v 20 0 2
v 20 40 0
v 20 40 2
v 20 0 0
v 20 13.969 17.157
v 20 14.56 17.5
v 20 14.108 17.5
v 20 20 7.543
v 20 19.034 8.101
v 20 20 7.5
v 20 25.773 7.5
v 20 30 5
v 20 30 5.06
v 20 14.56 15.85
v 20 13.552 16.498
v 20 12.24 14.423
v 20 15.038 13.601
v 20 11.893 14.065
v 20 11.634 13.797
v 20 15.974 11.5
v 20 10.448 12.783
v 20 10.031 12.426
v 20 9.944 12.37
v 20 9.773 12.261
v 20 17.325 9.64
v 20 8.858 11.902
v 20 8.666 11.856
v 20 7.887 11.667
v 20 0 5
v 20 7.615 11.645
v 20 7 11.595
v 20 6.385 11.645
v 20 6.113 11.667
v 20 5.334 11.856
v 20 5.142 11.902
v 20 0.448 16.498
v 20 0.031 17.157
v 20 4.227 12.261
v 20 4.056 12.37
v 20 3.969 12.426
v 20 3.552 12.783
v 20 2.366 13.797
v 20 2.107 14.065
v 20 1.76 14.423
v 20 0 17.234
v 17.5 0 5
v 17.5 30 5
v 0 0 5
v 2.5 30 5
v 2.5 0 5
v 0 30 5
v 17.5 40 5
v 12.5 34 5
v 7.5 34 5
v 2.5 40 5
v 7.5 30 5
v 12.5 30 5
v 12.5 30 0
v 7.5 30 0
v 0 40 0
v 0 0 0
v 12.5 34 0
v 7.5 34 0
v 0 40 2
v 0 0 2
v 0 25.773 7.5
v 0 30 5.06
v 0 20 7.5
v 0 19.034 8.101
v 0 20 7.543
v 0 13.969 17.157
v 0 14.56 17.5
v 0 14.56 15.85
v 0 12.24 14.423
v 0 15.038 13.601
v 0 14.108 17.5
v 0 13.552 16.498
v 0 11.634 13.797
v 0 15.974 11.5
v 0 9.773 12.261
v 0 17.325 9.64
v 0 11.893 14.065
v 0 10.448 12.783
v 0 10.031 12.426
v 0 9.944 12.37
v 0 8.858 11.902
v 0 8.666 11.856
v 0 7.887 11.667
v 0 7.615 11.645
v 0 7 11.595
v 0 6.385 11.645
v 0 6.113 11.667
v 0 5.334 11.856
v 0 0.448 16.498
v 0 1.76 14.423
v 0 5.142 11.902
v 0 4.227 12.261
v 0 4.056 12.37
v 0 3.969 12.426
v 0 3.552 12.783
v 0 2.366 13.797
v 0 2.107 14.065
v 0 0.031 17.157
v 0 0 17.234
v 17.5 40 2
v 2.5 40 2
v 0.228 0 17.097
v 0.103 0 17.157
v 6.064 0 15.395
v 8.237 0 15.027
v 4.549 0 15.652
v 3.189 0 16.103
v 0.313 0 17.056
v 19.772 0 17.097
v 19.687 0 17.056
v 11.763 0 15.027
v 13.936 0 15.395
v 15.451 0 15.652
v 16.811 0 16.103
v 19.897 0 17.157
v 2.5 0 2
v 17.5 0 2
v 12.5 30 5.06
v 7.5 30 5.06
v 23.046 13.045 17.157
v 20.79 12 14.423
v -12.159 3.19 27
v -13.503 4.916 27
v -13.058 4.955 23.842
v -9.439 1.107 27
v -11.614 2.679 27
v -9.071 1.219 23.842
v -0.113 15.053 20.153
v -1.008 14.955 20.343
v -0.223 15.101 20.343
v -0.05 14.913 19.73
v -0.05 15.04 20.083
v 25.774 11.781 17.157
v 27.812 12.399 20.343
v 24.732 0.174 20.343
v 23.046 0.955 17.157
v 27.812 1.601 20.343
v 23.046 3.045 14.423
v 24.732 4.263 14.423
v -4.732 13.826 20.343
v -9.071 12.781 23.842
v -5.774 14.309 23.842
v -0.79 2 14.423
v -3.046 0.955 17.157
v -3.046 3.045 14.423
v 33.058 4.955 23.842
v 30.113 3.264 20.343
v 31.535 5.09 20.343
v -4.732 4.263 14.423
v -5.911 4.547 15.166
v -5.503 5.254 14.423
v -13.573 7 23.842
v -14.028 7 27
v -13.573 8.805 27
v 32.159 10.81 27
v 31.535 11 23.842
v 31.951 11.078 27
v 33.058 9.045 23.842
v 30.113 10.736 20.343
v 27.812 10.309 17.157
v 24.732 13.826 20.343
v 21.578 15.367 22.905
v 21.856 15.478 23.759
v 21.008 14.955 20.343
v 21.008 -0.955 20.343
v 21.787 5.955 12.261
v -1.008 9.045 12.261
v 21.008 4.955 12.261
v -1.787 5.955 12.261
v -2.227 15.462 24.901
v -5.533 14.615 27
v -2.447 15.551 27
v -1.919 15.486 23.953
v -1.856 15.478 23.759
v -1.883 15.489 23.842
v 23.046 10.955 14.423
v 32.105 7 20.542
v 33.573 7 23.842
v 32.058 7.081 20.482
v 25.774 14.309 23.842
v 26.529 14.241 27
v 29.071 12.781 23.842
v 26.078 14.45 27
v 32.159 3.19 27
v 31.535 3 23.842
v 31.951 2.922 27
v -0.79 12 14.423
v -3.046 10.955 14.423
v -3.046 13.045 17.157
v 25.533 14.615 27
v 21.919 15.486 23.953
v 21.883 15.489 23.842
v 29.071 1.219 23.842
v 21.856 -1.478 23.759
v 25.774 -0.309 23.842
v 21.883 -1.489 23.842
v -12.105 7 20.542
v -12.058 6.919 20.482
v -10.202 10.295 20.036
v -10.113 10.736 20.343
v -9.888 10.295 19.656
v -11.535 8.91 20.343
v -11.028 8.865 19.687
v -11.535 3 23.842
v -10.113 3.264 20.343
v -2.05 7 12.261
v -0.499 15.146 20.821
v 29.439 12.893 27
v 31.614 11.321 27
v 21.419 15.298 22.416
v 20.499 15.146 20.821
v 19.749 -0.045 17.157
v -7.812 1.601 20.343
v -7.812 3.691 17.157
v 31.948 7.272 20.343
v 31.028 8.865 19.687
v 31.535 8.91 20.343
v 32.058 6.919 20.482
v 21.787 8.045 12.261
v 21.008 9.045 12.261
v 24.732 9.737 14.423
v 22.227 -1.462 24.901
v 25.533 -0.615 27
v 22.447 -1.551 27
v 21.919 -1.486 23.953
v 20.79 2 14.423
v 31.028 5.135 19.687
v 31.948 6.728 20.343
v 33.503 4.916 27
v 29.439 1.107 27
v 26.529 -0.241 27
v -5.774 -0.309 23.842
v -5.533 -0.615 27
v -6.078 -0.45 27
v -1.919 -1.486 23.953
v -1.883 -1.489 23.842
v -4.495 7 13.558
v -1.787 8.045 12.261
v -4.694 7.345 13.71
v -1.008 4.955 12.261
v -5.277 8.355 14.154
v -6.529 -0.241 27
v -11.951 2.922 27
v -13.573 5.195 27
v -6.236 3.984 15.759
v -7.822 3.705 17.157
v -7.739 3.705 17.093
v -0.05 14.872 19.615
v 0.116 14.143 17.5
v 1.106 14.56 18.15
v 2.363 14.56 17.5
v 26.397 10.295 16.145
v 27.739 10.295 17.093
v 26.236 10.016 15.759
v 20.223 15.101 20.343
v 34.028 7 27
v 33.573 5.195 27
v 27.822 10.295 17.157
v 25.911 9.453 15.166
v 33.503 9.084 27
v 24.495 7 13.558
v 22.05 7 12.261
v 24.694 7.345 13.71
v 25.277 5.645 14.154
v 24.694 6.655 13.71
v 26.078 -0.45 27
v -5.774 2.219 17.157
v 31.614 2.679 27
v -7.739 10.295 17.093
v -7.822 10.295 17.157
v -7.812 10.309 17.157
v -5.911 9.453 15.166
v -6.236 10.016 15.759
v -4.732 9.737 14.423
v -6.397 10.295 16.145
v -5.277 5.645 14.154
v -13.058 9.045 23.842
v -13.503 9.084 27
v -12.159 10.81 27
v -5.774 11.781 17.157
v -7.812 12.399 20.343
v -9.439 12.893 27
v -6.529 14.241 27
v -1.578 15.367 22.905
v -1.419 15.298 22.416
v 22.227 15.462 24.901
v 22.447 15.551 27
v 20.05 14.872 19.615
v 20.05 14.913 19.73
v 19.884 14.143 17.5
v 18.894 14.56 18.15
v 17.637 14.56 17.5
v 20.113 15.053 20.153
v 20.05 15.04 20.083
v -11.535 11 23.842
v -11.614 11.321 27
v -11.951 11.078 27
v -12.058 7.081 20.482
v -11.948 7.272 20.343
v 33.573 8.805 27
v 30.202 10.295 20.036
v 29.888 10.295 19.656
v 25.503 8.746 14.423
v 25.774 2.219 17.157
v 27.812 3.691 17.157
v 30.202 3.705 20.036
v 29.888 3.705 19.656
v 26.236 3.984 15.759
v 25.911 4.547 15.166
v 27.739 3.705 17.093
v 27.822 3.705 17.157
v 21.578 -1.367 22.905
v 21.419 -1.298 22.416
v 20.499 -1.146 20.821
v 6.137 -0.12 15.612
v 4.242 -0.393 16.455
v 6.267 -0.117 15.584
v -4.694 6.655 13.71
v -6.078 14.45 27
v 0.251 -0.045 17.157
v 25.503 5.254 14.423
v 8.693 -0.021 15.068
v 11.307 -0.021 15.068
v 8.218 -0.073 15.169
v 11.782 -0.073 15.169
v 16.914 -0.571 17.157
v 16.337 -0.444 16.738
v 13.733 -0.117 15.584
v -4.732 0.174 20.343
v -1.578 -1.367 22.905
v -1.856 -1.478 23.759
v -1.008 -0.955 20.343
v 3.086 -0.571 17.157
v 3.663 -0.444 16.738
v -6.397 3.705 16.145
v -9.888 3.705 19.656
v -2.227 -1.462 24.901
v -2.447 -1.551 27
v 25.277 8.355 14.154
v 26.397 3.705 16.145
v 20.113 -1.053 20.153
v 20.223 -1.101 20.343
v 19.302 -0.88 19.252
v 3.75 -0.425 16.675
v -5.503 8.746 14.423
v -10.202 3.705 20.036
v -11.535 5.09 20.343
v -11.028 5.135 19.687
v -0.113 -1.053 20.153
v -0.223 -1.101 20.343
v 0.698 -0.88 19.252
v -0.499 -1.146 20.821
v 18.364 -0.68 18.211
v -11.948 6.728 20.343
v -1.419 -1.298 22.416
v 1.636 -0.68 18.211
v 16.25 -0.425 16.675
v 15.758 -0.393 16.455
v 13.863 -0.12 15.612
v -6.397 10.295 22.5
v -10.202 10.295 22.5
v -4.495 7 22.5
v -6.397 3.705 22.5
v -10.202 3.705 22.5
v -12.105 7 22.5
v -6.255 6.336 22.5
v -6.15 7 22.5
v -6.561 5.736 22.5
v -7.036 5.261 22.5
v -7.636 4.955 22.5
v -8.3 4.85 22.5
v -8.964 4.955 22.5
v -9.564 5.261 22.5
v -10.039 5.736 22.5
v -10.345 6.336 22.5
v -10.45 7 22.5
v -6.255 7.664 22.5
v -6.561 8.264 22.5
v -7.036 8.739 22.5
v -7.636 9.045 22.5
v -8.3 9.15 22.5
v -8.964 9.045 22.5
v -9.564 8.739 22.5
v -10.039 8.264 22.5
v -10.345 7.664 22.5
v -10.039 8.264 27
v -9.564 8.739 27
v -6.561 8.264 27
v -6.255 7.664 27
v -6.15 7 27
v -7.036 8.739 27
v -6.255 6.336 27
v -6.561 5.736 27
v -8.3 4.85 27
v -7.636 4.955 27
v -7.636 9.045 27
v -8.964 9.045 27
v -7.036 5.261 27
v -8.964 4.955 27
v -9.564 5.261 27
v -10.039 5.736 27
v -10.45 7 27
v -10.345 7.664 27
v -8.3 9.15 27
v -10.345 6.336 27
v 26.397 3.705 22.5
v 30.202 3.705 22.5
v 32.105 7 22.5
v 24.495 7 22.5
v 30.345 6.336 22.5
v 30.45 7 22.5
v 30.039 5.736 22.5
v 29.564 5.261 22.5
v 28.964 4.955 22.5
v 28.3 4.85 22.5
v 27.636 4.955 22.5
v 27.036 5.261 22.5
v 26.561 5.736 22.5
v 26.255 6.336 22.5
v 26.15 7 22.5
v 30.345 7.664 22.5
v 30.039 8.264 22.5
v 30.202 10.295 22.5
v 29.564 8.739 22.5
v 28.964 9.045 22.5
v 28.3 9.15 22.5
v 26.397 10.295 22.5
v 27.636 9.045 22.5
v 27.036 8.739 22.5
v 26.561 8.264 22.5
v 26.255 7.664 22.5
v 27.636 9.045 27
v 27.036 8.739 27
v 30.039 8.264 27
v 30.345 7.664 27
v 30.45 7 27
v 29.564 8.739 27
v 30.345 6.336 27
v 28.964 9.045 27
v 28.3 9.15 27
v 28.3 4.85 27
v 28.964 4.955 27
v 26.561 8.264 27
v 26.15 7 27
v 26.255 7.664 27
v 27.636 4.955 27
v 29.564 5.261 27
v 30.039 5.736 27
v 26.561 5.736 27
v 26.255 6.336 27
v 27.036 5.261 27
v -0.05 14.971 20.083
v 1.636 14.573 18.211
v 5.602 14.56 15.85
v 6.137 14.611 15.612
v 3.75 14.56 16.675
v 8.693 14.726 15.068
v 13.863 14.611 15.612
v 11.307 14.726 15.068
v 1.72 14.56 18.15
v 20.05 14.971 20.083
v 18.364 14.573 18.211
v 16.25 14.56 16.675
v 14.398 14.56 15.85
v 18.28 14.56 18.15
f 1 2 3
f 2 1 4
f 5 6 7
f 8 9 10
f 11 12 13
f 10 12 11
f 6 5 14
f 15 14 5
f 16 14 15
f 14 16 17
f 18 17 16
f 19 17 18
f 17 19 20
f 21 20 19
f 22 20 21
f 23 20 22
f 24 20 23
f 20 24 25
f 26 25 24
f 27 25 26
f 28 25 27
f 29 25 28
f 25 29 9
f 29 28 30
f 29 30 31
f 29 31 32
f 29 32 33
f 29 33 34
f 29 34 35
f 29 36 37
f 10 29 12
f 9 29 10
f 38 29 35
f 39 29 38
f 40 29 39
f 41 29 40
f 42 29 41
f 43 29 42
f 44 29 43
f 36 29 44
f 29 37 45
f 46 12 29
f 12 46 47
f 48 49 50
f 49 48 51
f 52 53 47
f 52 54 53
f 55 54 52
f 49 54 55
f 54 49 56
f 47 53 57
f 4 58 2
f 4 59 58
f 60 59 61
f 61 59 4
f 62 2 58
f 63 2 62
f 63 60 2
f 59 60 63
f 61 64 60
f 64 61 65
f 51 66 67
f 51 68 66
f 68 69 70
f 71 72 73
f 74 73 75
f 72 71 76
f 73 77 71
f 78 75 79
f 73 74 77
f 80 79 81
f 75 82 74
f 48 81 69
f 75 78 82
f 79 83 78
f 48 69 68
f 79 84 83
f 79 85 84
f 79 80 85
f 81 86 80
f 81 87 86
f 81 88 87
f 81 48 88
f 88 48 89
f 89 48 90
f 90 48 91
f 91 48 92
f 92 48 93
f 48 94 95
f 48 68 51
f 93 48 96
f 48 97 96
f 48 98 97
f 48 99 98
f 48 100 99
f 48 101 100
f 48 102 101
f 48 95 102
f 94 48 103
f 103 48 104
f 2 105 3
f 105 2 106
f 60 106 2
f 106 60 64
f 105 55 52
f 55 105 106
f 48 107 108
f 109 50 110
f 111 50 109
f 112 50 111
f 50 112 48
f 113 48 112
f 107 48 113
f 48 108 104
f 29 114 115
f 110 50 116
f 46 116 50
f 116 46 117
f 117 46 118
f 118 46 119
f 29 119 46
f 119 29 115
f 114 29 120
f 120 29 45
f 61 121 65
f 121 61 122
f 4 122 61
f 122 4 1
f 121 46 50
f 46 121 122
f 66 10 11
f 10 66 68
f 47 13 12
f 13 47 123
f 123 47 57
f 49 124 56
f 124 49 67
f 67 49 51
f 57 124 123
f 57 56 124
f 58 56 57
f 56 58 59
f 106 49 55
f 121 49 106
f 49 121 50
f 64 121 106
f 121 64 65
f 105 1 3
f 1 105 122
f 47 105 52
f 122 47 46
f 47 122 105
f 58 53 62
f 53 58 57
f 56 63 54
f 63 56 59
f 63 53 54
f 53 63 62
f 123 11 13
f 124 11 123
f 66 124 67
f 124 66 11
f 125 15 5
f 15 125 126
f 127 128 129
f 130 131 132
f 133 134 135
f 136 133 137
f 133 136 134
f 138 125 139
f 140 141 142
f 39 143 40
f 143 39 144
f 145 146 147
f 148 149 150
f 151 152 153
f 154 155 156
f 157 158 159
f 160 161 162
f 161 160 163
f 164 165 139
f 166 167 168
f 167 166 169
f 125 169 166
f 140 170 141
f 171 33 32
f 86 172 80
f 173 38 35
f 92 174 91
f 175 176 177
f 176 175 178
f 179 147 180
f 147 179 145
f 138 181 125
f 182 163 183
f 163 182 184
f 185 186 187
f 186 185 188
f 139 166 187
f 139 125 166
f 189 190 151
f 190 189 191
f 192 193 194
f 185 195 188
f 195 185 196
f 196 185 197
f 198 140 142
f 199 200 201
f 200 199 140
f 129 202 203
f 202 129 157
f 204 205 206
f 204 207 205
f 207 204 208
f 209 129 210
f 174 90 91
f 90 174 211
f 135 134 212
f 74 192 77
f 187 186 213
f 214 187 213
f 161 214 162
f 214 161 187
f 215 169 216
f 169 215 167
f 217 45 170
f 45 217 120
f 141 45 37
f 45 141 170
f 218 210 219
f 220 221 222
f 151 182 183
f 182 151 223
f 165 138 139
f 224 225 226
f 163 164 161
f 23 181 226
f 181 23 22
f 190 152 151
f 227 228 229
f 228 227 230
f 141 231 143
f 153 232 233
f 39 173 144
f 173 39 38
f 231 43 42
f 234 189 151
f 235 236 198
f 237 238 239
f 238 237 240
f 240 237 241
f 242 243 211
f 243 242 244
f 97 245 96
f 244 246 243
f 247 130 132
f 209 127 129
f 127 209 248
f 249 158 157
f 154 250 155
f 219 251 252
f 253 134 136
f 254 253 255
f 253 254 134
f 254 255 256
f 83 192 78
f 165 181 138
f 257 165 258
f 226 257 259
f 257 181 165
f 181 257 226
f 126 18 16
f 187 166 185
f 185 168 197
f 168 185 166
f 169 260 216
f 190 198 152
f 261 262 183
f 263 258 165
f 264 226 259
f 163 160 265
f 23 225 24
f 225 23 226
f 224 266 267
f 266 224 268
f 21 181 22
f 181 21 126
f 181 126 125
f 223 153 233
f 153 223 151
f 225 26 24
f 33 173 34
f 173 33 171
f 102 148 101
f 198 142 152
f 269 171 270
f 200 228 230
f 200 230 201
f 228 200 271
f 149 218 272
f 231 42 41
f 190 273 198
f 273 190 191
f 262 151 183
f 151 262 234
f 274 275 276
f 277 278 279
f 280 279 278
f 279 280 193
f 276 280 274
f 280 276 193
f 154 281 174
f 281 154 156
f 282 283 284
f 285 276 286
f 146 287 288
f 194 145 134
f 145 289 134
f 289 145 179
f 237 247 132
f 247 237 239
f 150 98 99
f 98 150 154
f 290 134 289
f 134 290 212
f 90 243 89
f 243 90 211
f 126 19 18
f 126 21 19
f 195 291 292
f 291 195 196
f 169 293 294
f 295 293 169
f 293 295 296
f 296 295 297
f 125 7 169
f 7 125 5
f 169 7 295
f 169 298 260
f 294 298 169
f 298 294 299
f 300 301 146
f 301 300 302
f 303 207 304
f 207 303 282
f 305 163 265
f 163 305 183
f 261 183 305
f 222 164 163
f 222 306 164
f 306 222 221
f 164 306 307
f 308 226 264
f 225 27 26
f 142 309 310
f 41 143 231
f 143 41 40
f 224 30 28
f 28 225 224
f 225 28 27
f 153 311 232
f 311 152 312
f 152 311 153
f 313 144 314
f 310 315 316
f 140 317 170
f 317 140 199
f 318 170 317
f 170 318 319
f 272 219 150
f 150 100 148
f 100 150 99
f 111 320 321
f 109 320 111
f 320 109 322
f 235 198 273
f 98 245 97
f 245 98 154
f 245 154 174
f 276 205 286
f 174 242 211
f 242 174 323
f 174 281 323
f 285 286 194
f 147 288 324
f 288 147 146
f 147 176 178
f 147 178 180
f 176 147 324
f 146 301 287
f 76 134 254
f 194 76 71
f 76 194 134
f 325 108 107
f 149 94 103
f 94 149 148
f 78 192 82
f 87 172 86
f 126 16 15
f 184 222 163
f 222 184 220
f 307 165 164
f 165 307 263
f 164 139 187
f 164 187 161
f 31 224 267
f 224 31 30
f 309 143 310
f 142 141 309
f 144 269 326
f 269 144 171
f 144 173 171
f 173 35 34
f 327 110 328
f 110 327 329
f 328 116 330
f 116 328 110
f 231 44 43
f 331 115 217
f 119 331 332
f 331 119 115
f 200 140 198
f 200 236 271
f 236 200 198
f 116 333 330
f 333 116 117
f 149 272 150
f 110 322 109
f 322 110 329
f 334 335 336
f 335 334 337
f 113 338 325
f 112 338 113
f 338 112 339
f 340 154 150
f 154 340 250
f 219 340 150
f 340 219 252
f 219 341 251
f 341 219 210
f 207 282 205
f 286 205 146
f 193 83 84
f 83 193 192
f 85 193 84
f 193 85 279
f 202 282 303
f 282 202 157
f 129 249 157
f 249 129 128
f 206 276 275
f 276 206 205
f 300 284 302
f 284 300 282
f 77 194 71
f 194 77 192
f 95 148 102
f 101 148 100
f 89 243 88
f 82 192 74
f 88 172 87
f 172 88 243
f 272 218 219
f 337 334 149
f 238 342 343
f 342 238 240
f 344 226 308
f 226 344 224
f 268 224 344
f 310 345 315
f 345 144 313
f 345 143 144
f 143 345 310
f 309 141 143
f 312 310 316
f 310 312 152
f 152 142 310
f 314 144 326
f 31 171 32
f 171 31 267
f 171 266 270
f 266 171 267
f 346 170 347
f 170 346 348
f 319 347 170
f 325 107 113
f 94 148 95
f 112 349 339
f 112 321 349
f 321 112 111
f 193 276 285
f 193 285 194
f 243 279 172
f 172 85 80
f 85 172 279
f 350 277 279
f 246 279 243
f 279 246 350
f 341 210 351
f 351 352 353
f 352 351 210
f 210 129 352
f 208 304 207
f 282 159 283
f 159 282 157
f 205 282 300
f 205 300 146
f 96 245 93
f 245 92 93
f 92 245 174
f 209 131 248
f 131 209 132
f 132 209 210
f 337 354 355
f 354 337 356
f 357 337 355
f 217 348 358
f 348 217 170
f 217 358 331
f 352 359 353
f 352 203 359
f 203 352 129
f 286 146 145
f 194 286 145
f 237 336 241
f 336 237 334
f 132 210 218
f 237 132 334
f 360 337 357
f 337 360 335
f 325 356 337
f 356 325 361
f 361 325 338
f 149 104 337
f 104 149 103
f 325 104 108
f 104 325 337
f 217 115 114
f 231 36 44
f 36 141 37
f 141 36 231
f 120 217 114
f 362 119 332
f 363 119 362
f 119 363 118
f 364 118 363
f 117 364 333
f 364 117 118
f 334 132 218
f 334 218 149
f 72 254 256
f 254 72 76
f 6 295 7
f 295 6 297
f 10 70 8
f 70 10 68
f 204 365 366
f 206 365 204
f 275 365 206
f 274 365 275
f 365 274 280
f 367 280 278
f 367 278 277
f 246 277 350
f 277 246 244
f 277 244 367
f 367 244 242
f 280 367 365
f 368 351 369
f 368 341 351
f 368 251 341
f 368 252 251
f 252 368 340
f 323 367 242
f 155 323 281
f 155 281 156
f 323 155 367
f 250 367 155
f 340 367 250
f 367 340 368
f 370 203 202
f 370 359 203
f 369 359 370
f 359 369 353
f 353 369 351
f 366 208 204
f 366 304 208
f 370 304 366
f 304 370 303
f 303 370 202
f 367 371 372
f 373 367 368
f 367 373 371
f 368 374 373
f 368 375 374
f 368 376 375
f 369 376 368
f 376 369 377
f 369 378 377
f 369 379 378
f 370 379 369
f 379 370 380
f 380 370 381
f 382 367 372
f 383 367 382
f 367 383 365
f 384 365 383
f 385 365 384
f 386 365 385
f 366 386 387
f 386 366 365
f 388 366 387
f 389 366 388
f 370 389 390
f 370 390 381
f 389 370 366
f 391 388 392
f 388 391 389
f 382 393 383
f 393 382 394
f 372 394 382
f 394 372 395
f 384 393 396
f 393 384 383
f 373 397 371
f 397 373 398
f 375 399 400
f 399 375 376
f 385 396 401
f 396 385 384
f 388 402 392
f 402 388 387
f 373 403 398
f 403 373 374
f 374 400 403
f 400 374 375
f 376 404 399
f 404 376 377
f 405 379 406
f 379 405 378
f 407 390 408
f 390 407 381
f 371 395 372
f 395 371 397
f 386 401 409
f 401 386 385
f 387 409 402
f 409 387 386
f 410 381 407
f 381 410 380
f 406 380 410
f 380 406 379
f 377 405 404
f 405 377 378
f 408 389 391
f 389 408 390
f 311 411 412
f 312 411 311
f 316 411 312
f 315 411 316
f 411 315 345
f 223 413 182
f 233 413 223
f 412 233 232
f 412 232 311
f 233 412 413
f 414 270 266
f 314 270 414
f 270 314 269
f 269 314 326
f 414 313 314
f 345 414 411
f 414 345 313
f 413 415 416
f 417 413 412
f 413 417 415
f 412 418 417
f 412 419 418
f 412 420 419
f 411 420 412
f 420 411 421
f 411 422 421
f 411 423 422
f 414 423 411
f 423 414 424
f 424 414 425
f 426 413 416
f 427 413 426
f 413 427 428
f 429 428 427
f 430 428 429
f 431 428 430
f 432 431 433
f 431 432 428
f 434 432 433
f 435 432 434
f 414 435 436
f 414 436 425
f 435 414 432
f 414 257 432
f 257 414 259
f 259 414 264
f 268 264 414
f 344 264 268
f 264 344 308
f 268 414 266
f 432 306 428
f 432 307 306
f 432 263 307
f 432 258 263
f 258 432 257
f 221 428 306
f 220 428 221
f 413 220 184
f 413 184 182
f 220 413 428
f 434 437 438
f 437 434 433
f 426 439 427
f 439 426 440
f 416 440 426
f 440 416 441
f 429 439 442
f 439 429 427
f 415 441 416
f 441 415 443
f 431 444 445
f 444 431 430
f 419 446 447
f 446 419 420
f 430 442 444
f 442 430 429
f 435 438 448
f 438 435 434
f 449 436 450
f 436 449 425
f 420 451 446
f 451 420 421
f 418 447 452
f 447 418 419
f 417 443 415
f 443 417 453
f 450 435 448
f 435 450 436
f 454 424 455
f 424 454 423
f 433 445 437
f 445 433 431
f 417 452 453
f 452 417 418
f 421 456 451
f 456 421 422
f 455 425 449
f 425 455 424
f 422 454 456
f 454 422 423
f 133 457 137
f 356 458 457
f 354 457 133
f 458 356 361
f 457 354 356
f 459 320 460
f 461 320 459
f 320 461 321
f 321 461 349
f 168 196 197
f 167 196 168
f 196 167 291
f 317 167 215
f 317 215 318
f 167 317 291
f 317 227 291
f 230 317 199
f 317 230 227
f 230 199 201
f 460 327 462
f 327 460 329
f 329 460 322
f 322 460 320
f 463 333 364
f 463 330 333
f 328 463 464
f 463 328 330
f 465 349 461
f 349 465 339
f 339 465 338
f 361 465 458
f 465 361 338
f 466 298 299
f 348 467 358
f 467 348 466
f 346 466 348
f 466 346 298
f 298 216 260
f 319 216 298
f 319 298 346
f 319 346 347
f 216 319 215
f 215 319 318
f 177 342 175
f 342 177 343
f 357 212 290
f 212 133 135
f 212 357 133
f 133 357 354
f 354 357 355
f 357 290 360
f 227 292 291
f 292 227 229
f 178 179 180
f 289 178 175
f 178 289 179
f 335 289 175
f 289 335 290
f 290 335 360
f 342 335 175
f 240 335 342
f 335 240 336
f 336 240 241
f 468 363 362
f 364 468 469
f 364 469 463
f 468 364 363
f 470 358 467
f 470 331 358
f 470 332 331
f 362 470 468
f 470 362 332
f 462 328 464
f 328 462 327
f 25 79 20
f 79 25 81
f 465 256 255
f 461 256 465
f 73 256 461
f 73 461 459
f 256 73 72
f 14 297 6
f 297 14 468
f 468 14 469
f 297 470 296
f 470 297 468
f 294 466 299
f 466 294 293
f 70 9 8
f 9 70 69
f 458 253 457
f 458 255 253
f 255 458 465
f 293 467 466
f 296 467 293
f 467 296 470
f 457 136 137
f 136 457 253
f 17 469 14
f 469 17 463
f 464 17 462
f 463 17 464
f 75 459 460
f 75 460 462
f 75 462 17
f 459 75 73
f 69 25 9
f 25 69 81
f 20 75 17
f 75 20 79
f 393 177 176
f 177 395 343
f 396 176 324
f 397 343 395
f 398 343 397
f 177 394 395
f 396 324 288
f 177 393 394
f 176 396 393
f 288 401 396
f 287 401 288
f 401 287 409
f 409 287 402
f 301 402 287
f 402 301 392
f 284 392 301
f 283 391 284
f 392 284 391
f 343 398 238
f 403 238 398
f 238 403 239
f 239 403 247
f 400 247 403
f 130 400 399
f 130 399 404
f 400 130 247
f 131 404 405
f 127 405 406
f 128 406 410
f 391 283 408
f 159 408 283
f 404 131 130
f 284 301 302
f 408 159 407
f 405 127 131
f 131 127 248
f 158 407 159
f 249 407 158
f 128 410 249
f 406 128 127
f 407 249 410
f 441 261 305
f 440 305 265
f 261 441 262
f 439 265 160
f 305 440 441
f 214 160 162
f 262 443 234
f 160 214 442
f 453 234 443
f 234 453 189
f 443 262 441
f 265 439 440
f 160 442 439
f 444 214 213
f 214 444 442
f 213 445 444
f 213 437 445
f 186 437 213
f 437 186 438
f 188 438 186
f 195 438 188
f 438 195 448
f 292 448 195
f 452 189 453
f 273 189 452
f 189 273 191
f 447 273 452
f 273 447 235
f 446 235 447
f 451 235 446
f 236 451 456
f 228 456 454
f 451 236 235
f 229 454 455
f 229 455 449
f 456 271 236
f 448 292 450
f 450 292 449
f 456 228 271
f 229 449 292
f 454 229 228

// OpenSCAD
// file: lowerBracket.scad
/*
 * Object: lower bracket for bike headlight mount
 * Creator: Patrick Ma
 * Date started: 5/13/2014
 * Date completed: 
 * This is only the lower half of the bracket
 */

include <mountBase.scad>

/* 
 * Creates the lower bracket for the light proper
 * ID: inner diameter of bracket -- aka the outer dia of the light
 */
module lowerBracket(ID, lower){
	verticalOffset = 1.0*(ID-5);
	outerWidth = ID + 2*(3.65 + 4.3 + 3.65);	// the outer width is the ID + 2*(3.65mm + 4.3 + 3.65mm)
screwCenter = ID/2 + 3.65 + 4.3/2;	// = inner radius + offset + screw dia /2

	translate([0, 0, verticalOffset])
		difference() {
			// Adds
			union() {	
				resize([outerWidth, 20, ID + 10]) sphere(10); // forms the bracket body
				translate([-0.5*baseW, -7, -1*(ID-5)]) // attach to mountBase
					cube([baseW, 20, 10]);
			}

			// subtracts
			union() {
*				translate([0, 50, 0])cube(100, center=true); // for cross-section

				rotate([90, 0, 0])
					cylinder(h=2* ID, r=ID/2, center=true);	// hole for light

				translate([0, 18.5, 14.5-ID]) 
					rotate([0,90,0]) 
					cylinder(h=baseW+0.1, r=11, center=true);	// curve the front

				// On both side
				for(i =[-1,1])
				{
					// captured nut
					translate([i * screwCenter, 0, -10])
						rotate([180,0,0])
						cylinder(d=7.61, $fn=6, h=10, center=true);

					// screw hole
					translate([i*screwCenter, 0, -20])cylinder(d=4.3, h=40, $fn=20);

					// Countersunk bolt head
					translate([i*screwCenter, 0, 10])cylinder(d=7, h = 10, $fn=20, center=true);
				}

				// separate the top and bottom bracket
				cube ([100, ID + 20, 1], center=true);

				// top or bottom of bracket?
				if (lower) {
					translate([-50, -50, 0])cube(100);
				} else {
					rotate([180,0,0])translate([-50, -50, 0])cube(100);
				}
			}
		}
}

//// an example
//lowerBracket(25, true);
//lowerBracket(25);
// file: mountBase.scad
/*
* Object: Bicycle headlight mount
* Creator: Patrick Ma
* Date started: 5/33/2014
* Date completed: 
* This is only the lower half of the bracket
*/


// global variables

baseW = 20; // x-axis
baseL = 40; // y-axis
baseH = 5; // z-axis
baseTang = 15; // W of center ridge
lipH = 2; 
totalH = 1.5*baseH;// The total height of the base bracket

// locking hole
lockW = 5;	
lockL = 4;


/*
 * creates the section of the bracket that insets into the mounting bracket on
 * the bike.
 */
module mountBase() {
	slotW = (baseW - baseTang) /2;	// calculate the depth of the retaining slot
	difference(){

		// add these
		union() {
			cube([baseW, baseL, baseH]); // bottom
			translate([0,0,baseH]) 
				cube([baseW, 0.75*baseL, baseH/2]); // top
		}

		// subtract these
		union() {
			// create the slots
			for (i = [0,1]) {
#translate([(0.1)*(i-1) + i*(baseTang + slotW), -0.25, 2]) 
				cube([ slotW+0.1, baseL + 0.5, baseH - lipH]);
			}

			// create the locking hole
# translate([(baseW - lockW)/2, 30, -0.1])
			cube([lockW, lockL, totalH + 0.2]); 

			// bevel front of top
#translate([baseW/2, 0.75*baseL-1.4, 1.5*baseH+0.1]) 
			rotate([0, 90, 0]) rotate(60)
				cube([5, 3, baseW+0.1], center=true);

		}
	}
}

mountBase();
//translate([baseW /2, 7, totalH]) lowerBracket(25);
// main file
/*
* Object: Bicycle headlight mount
* Creator: Patrick Ma
* Date started: 5/13/2014
* Date completed: 
* Actual bike mount
*/

/*
 * This uses the top and bottom brackets, and the mounting base
 */
include <mountBase.scad>
include <lowerBracket.scad>

mountBase();
translate([baseW /2, 7, totalH]) lowerBracket(25, true);
//translate([baseW /2, 7, totalH]) lowerBracket(25, false);
